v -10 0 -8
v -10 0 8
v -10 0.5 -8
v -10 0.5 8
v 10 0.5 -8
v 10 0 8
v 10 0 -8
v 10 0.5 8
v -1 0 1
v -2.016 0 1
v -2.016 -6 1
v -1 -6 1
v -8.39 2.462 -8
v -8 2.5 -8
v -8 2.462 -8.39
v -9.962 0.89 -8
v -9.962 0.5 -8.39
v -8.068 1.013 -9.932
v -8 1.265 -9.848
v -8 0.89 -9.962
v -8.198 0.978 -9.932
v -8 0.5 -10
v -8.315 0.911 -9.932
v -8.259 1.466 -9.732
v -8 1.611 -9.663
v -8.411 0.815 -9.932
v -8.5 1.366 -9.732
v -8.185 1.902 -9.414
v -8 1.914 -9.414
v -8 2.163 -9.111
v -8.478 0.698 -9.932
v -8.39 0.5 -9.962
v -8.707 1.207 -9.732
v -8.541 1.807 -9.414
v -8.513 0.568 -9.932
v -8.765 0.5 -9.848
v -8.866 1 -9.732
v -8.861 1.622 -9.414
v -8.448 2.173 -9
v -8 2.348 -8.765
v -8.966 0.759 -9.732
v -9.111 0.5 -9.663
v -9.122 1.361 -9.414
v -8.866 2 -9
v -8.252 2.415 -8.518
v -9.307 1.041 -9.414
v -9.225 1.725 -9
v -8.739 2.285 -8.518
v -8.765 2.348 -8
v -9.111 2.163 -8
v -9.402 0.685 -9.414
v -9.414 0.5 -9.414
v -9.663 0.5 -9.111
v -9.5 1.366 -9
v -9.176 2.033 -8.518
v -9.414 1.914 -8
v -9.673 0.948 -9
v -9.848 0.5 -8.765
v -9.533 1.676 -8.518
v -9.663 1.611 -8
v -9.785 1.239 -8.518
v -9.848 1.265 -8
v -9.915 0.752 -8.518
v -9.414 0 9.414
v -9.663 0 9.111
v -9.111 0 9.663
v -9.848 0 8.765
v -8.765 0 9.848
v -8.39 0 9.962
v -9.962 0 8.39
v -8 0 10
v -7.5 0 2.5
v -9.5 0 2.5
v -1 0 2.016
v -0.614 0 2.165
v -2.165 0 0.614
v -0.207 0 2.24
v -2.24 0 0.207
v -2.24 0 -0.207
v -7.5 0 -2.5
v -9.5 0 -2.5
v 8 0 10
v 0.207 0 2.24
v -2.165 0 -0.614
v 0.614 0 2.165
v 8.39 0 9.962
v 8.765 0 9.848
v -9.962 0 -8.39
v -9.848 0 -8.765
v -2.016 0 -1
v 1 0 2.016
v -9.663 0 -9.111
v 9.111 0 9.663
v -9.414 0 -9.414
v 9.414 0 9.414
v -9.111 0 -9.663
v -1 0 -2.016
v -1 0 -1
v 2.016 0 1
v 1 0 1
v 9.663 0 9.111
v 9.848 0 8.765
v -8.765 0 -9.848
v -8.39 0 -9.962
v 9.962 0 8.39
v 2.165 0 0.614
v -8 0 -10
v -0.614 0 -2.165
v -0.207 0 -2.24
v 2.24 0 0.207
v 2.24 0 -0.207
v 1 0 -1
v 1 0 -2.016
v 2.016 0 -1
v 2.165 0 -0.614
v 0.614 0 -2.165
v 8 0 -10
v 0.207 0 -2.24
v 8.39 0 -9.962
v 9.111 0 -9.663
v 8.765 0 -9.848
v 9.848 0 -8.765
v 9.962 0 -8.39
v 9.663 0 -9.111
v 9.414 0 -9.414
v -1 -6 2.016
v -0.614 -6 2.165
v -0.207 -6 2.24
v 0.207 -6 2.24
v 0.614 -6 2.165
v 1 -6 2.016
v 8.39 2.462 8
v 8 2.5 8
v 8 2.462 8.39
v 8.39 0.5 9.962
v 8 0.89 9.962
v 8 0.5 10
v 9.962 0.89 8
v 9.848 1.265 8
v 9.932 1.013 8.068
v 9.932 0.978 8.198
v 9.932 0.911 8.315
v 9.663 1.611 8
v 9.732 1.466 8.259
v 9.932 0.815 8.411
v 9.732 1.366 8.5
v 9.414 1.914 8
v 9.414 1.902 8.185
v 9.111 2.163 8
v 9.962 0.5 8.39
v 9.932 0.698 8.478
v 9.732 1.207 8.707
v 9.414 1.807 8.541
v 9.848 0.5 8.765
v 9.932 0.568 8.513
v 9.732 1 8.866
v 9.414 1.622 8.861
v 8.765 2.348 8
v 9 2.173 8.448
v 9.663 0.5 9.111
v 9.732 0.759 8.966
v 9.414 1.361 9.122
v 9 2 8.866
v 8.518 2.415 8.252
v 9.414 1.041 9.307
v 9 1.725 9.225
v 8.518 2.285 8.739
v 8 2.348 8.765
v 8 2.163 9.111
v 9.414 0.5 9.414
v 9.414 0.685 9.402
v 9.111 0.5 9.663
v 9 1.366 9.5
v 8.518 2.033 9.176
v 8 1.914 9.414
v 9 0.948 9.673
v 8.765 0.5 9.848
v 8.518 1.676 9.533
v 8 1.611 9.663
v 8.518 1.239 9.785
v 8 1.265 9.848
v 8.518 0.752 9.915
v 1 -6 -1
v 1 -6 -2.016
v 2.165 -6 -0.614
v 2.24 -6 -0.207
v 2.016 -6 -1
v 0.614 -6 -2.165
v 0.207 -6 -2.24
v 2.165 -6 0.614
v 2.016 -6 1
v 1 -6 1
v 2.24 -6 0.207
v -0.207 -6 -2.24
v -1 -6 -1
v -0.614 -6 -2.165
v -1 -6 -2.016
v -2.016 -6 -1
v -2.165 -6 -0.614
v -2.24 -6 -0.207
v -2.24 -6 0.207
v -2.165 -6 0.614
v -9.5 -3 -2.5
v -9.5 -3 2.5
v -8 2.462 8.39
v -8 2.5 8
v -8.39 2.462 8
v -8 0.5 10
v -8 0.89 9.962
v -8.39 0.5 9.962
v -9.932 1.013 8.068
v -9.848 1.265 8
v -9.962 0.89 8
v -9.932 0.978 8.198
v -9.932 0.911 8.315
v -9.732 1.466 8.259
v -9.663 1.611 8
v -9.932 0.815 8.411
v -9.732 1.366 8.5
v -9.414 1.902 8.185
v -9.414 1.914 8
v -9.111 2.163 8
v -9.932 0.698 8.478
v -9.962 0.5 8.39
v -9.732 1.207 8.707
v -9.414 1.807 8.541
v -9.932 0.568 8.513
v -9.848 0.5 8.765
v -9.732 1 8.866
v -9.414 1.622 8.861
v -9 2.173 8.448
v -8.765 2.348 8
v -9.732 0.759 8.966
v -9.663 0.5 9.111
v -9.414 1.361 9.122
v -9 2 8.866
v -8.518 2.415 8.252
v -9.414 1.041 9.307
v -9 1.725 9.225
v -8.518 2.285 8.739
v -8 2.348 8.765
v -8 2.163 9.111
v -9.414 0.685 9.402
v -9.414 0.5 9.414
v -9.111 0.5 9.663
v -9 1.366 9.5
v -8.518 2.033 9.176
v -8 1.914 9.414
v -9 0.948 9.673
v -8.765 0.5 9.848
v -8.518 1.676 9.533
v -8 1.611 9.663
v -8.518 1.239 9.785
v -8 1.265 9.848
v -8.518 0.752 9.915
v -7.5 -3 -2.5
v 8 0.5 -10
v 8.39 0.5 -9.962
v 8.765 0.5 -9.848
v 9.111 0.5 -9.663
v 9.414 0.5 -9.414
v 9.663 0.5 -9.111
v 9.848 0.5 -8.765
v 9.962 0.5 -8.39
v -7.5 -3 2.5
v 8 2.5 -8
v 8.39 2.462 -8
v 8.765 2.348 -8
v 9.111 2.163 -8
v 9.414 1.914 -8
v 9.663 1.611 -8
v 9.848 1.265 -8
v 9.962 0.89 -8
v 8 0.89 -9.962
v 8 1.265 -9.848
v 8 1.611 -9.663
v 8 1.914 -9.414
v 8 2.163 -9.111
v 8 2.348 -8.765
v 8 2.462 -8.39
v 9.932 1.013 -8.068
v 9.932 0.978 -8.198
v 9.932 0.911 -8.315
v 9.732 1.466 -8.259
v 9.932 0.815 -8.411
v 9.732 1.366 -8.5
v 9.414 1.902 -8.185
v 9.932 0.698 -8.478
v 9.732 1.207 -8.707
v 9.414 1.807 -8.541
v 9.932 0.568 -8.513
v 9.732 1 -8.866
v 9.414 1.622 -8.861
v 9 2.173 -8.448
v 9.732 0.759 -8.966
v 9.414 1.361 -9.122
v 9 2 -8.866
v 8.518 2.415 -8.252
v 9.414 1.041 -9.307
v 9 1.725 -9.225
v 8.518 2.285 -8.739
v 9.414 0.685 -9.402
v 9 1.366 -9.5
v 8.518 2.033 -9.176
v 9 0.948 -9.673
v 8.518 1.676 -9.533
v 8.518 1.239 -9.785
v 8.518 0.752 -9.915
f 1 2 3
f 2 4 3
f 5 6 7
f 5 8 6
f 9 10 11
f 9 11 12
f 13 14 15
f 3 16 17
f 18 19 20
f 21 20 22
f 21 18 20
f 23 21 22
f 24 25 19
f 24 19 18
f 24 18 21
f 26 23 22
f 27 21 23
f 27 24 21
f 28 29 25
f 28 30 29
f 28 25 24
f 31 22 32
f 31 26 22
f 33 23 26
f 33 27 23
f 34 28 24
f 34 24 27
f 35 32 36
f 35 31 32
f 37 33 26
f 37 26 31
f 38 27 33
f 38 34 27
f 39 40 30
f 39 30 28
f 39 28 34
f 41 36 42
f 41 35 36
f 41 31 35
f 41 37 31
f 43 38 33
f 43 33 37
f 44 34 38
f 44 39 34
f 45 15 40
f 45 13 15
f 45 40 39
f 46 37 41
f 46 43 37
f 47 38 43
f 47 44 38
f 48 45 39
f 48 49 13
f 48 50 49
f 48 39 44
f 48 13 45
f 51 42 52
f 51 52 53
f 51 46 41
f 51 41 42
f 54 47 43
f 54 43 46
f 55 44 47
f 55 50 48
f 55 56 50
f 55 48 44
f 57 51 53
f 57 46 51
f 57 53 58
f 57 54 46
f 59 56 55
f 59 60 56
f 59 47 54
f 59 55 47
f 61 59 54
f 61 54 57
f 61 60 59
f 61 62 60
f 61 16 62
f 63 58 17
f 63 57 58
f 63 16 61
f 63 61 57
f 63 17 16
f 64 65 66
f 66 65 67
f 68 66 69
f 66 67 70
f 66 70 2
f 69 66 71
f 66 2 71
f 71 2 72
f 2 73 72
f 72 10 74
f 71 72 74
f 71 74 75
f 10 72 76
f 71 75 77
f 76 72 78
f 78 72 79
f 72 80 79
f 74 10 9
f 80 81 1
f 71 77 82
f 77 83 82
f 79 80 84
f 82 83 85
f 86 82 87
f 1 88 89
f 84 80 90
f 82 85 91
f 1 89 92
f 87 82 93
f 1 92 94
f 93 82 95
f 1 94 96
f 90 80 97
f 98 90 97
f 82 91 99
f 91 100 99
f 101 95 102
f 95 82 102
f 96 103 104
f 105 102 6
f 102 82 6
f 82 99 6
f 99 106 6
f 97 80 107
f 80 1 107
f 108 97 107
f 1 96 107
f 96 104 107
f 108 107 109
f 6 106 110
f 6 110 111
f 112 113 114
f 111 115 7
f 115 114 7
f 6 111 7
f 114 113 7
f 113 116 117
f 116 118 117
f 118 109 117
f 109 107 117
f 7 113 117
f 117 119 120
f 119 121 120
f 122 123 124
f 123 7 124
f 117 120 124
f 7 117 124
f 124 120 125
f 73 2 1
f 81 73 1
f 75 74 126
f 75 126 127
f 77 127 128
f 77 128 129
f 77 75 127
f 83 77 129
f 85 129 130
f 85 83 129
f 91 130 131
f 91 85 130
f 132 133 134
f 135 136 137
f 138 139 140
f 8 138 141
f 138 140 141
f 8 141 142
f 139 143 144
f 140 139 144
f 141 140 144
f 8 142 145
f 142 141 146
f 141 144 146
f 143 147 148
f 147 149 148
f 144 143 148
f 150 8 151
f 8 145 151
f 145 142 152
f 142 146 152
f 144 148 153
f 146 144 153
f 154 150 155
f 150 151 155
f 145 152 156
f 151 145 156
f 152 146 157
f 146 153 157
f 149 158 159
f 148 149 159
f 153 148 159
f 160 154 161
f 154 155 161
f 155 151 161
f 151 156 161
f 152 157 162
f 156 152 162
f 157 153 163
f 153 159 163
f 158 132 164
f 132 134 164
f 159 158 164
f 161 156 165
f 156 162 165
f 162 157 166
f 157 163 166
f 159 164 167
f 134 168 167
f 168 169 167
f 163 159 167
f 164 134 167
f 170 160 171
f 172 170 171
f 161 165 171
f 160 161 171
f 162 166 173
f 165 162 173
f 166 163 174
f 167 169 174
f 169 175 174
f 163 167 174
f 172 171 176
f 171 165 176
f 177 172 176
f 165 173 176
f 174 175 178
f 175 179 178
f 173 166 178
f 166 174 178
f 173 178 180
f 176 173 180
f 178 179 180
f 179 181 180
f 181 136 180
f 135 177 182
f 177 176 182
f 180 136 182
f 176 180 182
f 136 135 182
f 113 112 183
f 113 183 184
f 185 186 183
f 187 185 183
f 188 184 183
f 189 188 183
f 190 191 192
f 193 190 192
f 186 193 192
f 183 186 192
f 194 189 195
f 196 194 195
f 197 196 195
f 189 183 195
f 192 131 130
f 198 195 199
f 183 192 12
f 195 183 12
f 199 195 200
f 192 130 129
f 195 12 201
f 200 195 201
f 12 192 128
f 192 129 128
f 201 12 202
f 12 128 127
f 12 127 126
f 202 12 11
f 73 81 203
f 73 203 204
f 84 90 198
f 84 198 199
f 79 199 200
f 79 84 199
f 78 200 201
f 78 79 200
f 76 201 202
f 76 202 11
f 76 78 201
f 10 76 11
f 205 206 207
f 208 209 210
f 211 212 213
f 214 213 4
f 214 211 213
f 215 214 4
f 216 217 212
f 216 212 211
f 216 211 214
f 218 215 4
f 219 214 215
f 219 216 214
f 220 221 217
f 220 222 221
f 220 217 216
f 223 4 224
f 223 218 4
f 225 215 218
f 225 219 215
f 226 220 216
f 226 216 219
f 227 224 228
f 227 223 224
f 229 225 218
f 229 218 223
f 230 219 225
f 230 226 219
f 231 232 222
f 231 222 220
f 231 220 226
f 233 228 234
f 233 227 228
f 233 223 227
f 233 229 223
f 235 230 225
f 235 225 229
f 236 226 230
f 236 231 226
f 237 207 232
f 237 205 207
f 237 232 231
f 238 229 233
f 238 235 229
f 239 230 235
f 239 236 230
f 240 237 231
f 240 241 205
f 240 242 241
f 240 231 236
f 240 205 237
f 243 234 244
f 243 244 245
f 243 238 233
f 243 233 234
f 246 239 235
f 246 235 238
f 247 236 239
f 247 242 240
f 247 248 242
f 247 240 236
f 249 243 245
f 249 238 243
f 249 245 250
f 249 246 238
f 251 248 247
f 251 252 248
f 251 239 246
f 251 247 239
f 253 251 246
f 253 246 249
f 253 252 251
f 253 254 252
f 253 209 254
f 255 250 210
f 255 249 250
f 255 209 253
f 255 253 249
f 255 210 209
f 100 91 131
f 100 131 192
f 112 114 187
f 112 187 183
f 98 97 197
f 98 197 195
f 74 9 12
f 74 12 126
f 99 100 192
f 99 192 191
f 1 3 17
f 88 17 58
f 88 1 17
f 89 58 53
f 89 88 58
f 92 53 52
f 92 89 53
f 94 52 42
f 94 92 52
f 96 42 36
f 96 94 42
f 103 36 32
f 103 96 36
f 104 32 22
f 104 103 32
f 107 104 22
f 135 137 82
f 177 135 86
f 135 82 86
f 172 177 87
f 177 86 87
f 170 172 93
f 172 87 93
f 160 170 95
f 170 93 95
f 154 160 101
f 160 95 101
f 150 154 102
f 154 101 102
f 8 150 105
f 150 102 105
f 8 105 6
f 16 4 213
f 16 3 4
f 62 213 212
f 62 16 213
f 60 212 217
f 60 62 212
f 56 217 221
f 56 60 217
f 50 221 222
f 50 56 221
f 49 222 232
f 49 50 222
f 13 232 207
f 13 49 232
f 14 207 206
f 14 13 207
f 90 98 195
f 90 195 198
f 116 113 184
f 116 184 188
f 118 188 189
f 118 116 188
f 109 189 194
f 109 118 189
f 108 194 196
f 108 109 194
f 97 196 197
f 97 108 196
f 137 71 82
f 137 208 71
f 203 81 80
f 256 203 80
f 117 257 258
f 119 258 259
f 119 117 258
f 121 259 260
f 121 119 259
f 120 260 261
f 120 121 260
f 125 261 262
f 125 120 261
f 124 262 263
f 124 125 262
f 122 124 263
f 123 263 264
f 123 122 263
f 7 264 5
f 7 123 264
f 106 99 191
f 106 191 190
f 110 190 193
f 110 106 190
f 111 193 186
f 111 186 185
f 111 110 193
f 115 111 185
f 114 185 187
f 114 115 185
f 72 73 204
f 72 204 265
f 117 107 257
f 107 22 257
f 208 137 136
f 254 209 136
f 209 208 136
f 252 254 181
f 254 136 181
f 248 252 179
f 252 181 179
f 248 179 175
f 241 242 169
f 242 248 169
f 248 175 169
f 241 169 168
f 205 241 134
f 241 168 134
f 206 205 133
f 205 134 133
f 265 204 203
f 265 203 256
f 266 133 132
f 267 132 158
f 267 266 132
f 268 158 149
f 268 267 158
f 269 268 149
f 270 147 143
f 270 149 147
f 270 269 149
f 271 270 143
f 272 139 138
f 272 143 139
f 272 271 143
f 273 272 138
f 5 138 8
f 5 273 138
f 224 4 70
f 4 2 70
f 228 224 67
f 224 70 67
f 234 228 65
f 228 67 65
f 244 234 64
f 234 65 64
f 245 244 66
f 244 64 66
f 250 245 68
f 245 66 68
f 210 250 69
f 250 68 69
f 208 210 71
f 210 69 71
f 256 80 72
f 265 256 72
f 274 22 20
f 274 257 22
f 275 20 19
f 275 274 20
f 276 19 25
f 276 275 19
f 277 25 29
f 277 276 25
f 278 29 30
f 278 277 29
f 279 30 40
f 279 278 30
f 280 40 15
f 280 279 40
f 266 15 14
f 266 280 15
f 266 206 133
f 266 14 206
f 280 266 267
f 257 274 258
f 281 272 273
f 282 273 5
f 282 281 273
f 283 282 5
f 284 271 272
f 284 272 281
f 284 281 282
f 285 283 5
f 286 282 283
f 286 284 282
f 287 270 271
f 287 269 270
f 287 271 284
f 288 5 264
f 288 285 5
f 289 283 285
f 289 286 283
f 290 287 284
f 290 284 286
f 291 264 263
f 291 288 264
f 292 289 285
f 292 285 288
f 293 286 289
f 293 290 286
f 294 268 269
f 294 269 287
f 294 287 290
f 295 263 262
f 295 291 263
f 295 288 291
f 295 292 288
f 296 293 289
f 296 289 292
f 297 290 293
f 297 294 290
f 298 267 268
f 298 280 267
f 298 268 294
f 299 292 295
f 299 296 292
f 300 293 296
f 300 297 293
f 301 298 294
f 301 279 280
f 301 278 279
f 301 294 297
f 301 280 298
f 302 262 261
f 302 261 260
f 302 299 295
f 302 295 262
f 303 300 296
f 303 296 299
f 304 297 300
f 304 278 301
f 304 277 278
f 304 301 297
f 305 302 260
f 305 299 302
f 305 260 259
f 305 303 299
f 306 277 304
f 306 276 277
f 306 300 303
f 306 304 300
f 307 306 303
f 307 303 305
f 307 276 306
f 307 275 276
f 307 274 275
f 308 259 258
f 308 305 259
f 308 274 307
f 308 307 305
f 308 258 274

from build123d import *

# Parameters (mm, degrees)
SKETCH1_W           = 20
SKETCH1_H           = 20
BOSS_EXTRUDE1_DEPTH = 2.5
BOSS_EXTRUDE2_DEPTH = 6
SKETCH3_W           = 2
SKETCH3_H           = 5
BOSS_EXTRUDE3_DEPTH = 3
FILLET1_R           = 2


with BuildPart() as part:
    # Sketch1 → Boss-Extrude1 (new body)
    with BuildSketch(Plane(origin=(0, 2.5, 0), x_dir=(1, 0, 0), z_dir=(0, 1, 0))):
        Rectangle(SKETCH1_W, SKETCH1_H)
    extrude(amount=-BOSS_EXTRUDE1_DEPTH)

    # Sketch2 → Boss-Extrude2 (add)
    with BuildSketch(Plane.XZ):
        with BuildLine():
            Line((-2.015564435, 1.000000009), (-1.000000005, 1.000000009))
            Line((-1.000000005, 1.000000009), (-1.000000005, 2.015564439))
            ThreePointArc((-1.000000005, 2.015564439), (0, 2.250000005), (1.000000005, 2.015564439))
            Line((1.000000005, 2.015564439), (1.000000005, 1.000000009))
            Line((1.000000005, 1.000000009), (2.015564435, 1.000000009))
            ThreePointArc((2.015564435, 1.000000009), (2.25, 5e-09), (2.015564435, -1))
            Line((2.015564435, -1), (1.000000005, -1))
            Line((1.000000005, -1), (1.000000005, -2.01556443))
            ThreePointArc((1.000000005, -2.01556443), (0, -2.249999995), (-1.000000005, -2.01556443))
            Line((-1.000000005, -2.01556443), (-1.000000005, -1))
            Line((-1.000000005, -1), (-2.015564435, -1))
            ThreePointArc((-2.015564435, -1), (-2.25, 5e-09), (-2.015564435, 1.000000009))
        make_face()
    extrude(amount=BOSS_EXTRUDE2_DEPTH)

    # Sketch3 → Boss-Extrude3 (add)
    with BuildSketch(Plane.XZ):
        with Locations((-8.5, 0)):
            Rectangle(SKETCH3_W, SKETCH3_H)
    extrude(amount=BOSS_EXTRUDE3_DEPTH)

    # Fillet1
    fillet1_edges = [part.edges().sort_by_distance(p)[0] for p in [
        (0, 2.5, 10),
        (-10, 2.5, 0),
        (0, 2.5, -10),
        (10, 2.5, 0),
        (10, 1.25, 10),
        (-10, 1.25, 10),
        (-10, 1.25, -10),
        (10, 1.25, -10),
    ]]
    fillet(fillet1_edges, radius=FILLET1_R)


solid = part.part
